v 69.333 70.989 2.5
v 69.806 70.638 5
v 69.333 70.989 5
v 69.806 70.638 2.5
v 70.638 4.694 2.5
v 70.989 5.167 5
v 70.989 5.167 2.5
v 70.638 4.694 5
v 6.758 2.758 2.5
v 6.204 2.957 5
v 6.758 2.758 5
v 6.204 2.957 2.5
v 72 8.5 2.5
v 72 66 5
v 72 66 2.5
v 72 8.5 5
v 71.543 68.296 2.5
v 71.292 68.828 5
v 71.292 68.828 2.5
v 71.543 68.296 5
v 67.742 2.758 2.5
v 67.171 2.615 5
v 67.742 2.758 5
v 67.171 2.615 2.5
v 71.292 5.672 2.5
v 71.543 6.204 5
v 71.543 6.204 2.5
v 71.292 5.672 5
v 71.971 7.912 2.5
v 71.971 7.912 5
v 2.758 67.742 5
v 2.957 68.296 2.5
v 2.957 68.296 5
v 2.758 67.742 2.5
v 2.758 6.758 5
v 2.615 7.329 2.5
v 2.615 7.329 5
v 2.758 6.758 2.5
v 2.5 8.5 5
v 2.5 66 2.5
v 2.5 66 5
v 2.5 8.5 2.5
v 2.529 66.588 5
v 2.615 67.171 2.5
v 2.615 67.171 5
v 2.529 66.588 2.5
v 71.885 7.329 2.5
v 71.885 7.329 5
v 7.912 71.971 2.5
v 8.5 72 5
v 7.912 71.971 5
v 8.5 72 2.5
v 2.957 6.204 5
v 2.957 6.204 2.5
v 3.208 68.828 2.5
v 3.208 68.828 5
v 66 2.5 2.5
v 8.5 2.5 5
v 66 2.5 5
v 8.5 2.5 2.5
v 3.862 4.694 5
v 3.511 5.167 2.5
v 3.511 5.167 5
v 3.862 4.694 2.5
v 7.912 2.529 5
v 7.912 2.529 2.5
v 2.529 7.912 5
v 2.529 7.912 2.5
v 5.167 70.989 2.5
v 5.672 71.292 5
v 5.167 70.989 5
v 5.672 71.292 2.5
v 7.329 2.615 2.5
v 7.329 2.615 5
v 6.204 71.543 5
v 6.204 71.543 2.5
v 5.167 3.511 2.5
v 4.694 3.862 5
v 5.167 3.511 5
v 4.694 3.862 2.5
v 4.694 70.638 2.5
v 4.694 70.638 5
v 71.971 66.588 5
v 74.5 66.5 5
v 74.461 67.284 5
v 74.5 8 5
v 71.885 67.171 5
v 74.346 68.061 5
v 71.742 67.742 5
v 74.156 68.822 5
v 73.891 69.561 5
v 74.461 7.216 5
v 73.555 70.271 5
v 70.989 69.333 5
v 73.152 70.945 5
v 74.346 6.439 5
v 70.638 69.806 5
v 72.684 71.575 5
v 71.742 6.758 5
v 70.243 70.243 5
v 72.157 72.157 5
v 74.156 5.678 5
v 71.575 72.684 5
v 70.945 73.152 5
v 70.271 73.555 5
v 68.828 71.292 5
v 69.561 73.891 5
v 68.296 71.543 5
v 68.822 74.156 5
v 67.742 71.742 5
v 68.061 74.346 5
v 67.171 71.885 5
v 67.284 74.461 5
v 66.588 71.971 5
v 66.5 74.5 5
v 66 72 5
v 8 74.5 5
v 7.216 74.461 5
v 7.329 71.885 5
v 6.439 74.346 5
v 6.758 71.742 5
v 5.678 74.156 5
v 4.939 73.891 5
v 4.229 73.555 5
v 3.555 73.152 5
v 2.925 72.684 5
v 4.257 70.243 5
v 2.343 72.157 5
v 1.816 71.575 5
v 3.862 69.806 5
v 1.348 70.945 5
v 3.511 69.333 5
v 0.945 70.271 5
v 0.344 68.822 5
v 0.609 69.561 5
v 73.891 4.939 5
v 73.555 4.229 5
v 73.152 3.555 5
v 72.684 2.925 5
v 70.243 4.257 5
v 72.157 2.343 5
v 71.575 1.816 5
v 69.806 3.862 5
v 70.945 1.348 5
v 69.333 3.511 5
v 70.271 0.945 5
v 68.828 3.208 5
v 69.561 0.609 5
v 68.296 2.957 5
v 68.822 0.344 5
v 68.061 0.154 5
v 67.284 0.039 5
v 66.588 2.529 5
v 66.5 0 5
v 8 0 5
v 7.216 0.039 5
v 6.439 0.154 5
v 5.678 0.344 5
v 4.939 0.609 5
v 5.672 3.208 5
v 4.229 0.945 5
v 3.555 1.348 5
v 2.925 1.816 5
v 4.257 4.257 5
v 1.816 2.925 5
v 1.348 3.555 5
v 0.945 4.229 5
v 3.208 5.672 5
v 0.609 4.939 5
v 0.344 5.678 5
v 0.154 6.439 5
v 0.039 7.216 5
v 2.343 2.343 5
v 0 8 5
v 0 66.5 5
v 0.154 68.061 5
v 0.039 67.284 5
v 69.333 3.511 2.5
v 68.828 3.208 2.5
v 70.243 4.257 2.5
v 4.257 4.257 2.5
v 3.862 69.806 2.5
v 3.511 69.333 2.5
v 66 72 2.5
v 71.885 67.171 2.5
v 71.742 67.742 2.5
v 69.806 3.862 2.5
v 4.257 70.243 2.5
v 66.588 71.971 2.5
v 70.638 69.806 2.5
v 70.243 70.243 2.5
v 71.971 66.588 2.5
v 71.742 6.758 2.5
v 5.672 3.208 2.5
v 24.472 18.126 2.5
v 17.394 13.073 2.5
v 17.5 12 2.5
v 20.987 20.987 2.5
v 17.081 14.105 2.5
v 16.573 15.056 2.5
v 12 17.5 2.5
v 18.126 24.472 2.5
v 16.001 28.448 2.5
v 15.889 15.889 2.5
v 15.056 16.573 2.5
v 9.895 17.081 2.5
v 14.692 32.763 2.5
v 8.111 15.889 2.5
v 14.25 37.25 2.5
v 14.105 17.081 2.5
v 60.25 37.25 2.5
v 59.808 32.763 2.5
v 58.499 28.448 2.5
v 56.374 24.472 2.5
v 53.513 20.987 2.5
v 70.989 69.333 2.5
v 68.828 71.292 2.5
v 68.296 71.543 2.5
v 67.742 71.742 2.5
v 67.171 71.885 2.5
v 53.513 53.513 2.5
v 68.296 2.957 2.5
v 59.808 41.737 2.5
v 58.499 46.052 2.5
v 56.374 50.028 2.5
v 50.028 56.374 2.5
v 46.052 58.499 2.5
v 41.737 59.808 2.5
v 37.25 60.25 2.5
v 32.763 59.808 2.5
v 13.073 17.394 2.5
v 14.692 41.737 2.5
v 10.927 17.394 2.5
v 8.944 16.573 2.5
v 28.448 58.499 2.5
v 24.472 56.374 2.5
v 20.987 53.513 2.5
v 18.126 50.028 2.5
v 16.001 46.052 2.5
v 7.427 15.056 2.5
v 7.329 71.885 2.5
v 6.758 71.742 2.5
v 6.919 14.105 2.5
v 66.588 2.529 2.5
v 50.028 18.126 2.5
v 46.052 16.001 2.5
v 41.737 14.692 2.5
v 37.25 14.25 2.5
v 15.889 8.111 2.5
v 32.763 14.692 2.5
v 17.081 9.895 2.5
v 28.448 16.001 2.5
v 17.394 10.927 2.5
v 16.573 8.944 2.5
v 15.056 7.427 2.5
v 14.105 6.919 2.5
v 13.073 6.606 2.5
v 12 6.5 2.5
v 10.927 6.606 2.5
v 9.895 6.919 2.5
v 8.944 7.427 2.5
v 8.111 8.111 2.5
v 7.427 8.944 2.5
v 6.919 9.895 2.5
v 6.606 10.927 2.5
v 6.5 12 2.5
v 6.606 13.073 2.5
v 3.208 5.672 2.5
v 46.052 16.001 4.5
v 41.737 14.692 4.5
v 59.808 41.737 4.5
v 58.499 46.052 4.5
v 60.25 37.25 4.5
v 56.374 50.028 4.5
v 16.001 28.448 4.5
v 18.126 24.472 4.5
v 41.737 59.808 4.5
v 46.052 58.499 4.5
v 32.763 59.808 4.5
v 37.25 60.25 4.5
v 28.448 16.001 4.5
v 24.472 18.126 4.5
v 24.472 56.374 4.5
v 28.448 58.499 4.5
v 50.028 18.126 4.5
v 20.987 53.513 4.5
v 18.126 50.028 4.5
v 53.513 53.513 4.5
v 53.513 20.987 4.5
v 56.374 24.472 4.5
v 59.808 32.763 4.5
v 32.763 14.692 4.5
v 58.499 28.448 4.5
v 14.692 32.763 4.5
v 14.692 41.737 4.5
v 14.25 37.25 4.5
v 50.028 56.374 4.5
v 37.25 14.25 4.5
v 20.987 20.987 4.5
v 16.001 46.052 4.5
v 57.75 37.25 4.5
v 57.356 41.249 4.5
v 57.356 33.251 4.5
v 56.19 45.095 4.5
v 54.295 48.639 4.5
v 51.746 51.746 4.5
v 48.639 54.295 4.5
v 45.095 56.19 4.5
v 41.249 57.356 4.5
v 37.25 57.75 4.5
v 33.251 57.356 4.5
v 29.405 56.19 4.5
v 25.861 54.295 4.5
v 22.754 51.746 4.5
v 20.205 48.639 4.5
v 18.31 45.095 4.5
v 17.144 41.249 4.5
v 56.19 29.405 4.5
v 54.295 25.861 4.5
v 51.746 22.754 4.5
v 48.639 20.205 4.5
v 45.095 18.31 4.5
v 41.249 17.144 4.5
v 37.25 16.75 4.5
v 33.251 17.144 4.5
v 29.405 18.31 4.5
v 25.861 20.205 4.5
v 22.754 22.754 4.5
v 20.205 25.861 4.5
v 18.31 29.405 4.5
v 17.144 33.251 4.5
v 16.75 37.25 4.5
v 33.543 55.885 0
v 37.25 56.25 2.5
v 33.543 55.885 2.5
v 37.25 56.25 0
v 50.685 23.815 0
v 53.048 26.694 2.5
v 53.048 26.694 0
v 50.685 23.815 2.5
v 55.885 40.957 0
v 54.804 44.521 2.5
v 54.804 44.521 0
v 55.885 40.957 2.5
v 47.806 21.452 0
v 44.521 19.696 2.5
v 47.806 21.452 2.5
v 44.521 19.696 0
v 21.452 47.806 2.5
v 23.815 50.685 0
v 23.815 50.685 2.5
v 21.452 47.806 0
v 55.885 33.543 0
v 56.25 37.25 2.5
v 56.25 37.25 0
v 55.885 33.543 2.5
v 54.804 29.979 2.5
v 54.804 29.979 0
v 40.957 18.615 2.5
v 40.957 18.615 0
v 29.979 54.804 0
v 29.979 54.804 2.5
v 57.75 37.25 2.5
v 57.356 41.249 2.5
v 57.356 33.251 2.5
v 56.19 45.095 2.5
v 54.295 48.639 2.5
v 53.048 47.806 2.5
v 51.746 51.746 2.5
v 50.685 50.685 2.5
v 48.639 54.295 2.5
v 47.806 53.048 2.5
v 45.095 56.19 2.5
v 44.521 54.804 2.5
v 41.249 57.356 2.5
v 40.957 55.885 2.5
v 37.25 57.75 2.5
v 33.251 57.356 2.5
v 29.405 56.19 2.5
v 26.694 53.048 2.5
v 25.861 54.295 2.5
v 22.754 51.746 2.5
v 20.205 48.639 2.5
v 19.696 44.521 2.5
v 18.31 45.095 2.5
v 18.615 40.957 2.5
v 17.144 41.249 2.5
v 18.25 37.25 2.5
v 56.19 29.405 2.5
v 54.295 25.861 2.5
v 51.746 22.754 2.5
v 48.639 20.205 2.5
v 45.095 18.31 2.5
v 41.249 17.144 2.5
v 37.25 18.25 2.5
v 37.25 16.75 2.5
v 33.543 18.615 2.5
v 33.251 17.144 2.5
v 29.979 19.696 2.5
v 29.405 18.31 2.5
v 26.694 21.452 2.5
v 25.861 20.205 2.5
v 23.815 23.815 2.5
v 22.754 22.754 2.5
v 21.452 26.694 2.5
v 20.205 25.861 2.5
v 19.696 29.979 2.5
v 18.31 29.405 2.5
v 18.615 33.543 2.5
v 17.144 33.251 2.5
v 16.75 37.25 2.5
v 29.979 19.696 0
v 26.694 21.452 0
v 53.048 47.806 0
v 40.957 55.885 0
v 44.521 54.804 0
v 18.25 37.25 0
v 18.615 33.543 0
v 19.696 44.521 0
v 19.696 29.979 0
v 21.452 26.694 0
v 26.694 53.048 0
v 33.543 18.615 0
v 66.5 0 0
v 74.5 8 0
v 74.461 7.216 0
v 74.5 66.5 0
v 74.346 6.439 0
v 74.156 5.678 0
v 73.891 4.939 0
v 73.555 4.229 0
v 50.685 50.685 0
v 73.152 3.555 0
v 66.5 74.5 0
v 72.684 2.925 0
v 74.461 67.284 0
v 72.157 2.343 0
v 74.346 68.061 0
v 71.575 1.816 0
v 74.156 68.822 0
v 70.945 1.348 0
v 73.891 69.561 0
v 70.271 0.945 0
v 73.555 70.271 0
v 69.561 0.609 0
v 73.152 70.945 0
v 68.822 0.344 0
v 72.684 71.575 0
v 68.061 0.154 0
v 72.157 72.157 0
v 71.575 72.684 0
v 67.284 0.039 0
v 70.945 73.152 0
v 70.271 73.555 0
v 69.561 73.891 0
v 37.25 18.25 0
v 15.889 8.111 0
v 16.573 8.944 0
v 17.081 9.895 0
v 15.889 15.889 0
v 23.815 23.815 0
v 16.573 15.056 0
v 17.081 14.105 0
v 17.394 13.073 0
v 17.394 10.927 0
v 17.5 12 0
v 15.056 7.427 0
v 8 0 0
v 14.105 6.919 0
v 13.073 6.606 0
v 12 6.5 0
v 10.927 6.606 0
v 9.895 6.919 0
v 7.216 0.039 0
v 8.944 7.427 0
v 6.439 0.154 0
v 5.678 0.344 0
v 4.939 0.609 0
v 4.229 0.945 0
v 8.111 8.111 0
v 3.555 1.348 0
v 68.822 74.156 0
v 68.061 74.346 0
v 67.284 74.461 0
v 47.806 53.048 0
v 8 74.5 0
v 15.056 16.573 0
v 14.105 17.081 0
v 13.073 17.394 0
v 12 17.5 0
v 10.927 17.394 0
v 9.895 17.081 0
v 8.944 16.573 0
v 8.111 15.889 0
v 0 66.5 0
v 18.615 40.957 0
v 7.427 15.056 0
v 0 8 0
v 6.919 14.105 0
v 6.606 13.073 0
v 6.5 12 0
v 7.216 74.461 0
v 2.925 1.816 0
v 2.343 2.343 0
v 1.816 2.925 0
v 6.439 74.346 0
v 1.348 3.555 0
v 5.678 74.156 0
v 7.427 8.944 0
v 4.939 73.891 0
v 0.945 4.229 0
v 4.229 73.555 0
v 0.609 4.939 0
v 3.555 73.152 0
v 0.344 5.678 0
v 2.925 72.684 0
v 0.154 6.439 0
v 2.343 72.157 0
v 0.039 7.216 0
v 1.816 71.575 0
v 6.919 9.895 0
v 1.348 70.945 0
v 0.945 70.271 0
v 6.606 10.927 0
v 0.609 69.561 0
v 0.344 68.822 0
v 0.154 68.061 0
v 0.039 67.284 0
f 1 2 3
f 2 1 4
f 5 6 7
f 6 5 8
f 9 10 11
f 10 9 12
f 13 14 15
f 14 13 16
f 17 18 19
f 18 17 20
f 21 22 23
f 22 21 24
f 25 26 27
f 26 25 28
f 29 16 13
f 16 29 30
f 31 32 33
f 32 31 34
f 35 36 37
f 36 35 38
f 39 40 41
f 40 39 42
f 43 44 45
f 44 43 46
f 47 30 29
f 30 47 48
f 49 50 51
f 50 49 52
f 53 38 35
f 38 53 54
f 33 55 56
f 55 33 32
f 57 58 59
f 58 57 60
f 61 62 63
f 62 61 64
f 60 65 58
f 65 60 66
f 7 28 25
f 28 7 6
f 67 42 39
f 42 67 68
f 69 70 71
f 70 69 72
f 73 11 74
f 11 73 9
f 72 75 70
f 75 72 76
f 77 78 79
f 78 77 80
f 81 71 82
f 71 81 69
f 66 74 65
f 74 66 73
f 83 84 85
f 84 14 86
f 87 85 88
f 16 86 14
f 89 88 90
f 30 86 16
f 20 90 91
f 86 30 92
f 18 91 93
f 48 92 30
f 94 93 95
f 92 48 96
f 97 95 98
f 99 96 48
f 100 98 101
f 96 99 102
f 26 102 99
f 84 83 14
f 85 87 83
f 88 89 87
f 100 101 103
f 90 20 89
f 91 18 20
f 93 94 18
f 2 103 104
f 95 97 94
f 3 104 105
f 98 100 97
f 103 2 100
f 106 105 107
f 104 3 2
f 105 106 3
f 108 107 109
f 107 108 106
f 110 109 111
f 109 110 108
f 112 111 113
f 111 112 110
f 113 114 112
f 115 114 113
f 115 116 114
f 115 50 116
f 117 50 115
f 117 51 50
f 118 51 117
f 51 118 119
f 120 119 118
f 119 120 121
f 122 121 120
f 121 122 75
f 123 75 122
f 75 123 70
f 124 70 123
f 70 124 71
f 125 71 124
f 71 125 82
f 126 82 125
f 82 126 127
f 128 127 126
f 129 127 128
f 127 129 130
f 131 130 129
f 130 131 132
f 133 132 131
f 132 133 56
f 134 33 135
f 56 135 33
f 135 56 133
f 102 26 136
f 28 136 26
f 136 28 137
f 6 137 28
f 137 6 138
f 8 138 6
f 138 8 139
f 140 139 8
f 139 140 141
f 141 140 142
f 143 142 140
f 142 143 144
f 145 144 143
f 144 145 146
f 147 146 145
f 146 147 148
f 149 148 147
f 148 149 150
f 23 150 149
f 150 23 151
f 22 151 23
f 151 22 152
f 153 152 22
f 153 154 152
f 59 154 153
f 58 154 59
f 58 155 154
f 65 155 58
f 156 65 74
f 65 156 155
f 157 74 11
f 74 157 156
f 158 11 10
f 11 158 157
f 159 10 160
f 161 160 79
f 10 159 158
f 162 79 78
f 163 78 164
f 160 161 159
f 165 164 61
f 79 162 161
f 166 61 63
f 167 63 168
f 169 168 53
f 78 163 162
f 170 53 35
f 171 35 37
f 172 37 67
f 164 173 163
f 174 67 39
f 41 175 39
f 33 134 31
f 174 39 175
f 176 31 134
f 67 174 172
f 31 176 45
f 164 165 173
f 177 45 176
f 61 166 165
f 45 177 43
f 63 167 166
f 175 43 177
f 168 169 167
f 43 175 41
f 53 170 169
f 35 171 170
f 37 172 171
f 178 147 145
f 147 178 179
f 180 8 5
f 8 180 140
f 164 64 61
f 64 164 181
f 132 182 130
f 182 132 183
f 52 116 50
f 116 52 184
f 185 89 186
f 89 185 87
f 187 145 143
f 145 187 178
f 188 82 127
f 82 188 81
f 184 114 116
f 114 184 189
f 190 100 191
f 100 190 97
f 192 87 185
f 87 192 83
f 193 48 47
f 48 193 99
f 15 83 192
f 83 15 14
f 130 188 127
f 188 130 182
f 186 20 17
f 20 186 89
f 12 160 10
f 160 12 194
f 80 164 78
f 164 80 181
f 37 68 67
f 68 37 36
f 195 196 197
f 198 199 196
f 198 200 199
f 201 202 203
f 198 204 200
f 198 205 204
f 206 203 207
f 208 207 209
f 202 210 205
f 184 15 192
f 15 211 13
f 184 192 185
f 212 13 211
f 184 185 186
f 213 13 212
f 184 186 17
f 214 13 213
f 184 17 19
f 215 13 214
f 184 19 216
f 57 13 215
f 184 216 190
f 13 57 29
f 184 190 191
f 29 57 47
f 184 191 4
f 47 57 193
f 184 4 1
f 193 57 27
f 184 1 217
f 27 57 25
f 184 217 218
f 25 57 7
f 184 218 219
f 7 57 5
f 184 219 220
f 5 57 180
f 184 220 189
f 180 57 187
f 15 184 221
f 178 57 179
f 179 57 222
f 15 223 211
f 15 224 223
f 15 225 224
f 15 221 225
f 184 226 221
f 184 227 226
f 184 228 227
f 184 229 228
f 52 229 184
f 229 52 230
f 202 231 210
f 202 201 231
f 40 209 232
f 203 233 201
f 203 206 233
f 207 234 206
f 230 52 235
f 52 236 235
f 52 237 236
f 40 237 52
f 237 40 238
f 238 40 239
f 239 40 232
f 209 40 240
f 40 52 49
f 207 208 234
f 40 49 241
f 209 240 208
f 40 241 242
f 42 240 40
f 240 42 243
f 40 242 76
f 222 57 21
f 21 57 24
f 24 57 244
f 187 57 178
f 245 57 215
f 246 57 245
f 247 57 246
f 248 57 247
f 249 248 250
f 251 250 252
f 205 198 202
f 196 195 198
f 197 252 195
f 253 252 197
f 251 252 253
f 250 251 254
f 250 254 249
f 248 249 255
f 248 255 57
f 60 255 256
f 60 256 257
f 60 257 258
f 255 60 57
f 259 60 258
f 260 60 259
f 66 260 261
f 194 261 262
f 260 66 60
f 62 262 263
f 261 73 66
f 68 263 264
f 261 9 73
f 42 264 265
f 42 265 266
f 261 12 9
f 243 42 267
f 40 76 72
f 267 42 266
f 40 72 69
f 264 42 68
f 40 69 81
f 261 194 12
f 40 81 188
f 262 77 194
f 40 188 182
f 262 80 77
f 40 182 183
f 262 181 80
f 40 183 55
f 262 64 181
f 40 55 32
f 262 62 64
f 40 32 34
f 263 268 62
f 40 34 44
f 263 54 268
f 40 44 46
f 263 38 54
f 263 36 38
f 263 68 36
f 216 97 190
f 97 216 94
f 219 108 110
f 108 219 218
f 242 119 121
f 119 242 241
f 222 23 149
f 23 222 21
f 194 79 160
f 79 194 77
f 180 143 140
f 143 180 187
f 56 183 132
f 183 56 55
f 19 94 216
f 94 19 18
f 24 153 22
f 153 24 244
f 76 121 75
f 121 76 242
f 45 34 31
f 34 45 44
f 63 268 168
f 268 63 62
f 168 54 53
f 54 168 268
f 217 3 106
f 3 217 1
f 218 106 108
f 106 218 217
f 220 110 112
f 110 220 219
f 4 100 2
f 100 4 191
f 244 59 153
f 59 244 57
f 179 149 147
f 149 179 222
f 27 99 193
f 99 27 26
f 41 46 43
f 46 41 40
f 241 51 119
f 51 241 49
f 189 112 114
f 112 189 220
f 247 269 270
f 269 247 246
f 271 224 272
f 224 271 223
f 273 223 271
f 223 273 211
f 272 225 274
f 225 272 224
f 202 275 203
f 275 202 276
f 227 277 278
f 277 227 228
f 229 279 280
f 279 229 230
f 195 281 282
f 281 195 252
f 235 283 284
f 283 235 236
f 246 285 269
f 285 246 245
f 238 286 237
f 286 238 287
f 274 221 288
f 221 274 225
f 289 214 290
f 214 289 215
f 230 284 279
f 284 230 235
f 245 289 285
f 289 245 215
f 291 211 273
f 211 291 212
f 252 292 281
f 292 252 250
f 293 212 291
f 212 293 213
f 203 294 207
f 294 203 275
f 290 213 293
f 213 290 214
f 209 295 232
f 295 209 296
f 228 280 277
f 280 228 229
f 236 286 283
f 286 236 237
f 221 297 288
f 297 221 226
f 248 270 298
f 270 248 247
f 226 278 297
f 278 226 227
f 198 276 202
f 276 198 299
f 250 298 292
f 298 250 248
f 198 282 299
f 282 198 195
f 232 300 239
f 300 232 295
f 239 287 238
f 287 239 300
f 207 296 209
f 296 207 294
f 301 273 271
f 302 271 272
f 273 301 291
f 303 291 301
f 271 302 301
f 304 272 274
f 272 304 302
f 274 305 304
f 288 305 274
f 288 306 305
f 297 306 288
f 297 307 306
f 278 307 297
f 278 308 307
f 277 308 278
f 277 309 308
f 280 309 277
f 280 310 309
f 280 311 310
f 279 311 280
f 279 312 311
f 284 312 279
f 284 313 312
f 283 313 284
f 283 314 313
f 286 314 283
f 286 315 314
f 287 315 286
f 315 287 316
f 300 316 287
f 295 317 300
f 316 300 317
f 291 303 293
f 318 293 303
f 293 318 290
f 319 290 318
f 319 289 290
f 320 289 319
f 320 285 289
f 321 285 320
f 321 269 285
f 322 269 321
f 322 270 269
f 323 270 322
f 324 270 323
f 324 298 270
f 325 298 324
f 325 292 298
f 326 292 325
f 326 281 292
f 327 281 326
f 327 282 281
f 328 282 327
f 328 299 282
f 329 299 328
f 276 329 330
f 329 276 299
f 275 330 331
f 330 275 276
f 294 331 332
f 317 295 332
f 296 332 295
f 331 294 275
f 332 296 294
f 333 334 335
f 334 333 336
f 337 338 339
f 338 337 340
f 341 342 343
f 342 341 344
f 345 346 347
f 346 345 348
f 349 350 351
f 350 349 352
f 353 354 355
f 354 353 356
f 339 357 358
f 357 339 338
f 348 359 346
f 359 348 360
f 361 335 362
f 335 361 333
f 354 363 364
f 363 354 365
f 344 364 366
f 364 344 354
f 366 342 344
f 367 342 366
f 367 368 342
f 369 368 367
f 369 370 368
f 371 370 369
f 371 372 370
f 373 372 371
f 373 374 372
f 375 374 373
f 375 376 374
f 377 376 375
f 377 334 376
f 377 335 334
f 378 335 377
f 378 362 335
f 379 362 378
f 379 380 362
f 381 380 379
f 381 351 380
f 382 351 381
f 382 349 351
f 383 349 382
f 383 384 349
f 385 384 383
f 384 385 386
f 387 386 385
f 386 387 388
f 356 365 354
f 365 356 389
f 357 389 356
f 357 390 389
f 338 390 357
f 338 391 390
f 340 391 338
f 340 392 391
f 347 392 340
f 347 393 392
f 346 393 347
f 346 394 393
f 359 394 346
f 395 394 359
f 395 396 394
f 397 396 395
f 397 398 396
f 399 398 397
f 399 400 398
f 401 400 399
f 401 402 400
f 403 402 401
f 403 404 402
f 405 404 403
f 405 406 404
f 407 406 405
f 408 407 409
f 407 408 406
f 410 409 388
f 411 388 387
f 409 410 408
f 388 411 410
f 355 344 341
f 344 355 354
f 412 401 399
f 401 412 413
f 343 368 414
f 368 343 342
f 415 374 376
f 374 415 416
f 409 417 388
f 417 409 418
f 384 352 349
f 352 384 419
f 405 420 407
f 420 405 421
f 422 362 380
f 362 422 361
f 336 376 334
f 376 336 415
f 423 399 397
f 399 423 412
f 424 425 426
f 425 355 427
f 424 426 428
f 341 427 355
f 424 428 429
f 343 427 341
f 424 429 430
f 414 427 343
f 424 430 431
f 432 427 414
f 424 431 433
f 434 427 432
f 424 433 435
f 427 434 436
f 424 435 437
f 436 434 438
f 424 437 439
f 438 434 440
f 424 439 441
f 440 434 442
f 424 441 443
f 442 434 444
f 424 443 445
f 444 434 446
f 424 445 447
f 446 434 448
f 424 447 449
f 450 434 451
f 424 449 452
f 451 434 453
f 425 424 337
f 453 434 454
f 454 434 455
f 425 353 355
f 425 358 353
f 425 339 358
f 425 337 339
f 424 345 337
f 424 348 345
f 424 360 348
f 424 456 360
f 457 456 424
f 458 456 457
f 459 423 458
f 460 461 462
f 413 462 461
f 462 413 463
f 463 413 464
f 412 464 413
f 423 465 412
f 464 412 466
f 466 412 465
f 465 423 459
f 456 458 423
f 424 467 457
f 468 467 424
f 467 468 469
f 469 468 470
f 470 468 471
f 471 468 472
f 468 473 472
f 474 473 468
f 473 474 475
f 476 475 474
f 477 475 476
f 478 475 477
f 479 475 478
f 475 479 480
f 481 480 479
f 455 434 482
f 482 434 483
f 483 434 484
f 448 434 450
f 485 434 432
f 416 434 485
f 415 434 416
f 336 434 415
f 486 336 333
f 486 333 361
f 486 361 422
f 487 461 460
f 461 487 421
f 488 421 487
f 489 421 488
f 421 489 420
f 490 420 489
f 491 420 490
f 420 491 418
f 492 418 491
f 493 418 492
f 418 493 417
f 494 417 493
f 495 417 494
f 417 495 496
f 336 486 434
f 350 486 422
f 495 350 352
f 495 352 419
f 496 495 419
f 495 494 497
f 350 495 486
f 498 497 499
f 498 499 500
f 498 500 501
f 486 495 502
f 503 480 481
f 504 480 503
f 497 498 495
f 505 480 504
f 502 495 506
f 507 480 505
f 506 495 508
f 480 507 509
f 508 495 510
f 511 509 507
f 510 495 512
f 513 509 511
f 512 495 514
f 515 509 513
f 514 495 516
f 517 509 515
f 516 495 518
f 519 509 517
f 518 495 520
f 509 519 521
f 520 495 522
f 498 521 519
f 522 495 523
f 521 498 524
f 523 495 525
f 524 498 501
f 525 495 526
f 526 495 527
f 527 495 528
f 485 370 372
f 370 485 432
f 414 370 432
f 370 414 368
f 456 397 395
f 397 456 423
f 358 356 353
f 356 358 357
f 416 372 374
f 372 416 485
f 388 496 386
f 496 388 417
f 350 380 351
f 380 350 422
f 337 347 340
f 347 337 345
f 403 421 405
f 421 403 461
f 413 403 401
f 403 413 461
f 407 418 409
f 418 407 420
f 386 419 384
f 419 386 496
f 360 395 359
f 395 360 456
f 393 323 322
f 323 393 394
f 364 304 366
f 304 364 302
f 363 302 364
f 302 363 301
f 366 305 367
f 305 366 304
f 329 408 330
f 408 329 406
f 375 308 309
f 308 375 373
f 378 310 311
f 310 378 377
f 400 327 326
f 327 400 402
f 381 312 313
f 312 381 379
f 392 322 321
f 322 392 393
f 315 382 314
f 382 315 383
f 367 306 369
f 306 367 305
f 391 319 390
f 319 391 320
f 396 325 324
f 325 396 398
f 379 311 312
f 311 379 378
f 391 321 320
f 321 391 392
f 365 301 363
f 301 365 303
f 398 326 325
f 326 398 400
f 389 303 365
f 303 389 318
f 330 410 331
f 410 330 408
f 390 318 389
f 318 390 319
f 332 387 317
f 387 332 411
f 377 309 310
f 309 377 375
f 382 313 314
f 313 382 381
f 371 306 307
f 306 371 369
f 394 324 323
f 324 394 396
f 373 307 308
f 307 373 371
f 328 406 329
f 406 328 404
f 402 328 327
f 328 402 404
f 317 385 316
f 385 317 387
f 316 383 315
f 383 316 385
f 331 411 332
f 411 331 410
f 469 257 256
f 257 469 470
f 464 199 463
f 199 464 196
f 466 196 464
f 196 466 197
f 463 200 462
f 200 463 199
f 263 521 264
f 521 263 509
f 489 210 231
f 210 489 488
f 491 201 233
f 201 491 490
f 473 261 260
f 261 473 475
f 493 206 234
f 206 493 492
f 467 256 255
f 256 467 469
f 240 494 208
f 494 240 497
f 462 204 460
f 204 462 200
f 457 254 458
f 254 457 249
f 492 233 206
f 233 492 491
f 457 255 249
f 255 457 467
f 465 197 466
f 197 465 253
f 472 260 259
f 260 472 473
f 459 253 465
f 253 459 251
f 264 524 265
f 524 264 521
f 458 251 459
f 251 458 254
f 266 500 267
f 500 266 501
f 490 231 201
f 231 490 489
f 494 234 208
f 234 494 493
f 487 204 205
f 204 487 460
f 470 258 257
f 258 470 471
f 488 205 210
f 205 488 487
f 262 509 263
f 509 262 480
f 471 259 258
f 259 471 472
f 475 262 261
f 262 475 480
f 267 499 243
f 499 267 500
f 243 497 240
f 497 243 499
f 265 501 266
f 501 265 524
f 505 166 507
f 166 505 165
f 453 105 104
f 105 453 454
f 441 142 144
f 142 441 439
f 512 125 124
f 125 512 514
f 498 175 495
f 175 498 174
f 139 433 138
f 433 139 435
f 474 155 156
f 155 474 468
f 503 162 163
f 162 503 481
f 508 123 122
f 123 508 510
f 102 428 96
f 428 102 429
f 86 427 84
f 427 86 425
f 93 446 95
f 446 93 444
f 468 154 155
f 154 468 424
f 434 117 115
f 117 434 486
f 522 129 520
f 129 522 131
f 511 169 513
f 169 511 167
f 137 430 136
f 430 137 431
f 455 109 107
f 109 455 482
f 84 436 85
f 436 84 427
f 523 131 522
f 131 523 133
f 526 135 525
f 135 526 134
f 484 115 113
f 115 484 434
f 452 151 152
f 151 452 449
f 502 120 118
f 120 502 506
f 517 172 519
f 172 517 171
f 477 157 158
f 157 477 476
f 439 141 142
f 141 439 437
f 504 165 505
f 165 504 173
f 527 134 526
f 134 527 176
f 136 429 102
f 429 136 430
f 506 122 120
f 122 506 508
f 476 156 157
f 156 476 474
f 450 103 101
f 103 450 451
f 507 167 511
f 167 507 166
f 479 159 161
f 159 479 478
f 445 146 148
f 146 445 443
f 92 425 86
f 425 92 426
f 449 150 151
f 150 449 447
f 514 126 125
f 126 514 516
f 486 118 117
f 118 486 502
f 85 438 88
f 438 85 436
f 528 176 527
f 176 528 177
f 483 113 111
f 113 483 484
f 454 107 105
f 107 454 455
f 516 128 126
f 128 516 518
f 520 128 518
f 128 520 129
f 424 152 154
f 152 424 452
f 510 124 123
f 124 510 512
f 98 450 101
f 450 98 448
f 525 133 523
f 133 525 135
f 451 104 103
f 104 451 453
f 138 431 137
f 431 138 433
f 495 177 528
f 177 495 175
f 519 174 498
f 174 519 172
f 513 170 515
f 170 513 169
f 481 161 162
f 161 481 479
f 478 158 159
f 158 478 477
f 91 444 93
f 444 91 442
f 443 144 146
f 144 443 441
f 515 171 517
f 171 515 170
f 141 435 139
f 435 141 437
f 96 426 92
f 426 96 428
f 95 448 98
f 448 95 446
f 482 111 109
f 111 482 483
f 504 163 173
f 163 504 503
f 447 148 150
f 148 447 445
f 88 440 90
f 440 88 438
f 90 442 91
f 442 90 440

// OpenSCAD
// file: dimensions.scad
wall_thickness = 2.5;

case_width = 80;
case_length = 80;
case_height = 80*1.618;

pcb_width = 48.5;
pcb_lenght = 45.25;

main_body_height = 80;
top_cover_height = 80*1.618-80;
// file: rounded_cube.scad
module rounded_cube(a,b,c,r){
    hull(){
        translate([r,r,0]) cylinder(r=r, h=c, $fn=64);
        translate([a-r,r,0]) cylinder(r=r, h=c, $fn=64);
        translate([a-r,b-r,0]) cylinder(r=r, h=c, $fn=64);
        translate([r,b-r,0]) cylinder(r=r, h=c, $fn=64);
    }
}
// main file
include <rounded_cube.scad>
include <dimensions.scad>

width = case_width-2*wall_thickness-0.5;
length = case_length-2*wall_thickness-0.5;

module speaker_holder_base(){
    rounded_cube(width,length,2*wall_thickness,8);
};

module speaker_holder_cuts(){
    difference() {
        translate([wall_thickness,wall_thickness,wall_thickness]) rounded_cube(width-2*wall_thickness,length-2*wall_thickness,wall_thickness,6);
    translate([(width)/2,(length)/2,wall_thickness]) cylinder(r=(41+2*wall_thickness)/2,h=wall_thickness,$fn=32);
    }

    translate([(width)/2,(length)/2,wall_thickness+2]) cylinder(r=(41+2*wall_thickness)/2,h=wall_thickness,$fn=32);

    translate([(width)/2,(length)/2,0]) cylinder(r=38/2,h=wall_thickness,$fn=32);
    translate([(width)/2,(length)/2,wall_thickness]) cylinder(r=41/2,h=wall_thickness,$fn=32);

    translate([(width)/2,(length)/2,0]) cylinder(r=38/2,h=wall_thickness,$fn=32);
    translate([12,12,0]) cylinder(r=11/2,h=wall_thickness,$fn=32);
};

module speaker_holder(){
    difference() {
        speaker_holder_base();
        speaker_holder_cuts();
    }
};

speaker_holder();
